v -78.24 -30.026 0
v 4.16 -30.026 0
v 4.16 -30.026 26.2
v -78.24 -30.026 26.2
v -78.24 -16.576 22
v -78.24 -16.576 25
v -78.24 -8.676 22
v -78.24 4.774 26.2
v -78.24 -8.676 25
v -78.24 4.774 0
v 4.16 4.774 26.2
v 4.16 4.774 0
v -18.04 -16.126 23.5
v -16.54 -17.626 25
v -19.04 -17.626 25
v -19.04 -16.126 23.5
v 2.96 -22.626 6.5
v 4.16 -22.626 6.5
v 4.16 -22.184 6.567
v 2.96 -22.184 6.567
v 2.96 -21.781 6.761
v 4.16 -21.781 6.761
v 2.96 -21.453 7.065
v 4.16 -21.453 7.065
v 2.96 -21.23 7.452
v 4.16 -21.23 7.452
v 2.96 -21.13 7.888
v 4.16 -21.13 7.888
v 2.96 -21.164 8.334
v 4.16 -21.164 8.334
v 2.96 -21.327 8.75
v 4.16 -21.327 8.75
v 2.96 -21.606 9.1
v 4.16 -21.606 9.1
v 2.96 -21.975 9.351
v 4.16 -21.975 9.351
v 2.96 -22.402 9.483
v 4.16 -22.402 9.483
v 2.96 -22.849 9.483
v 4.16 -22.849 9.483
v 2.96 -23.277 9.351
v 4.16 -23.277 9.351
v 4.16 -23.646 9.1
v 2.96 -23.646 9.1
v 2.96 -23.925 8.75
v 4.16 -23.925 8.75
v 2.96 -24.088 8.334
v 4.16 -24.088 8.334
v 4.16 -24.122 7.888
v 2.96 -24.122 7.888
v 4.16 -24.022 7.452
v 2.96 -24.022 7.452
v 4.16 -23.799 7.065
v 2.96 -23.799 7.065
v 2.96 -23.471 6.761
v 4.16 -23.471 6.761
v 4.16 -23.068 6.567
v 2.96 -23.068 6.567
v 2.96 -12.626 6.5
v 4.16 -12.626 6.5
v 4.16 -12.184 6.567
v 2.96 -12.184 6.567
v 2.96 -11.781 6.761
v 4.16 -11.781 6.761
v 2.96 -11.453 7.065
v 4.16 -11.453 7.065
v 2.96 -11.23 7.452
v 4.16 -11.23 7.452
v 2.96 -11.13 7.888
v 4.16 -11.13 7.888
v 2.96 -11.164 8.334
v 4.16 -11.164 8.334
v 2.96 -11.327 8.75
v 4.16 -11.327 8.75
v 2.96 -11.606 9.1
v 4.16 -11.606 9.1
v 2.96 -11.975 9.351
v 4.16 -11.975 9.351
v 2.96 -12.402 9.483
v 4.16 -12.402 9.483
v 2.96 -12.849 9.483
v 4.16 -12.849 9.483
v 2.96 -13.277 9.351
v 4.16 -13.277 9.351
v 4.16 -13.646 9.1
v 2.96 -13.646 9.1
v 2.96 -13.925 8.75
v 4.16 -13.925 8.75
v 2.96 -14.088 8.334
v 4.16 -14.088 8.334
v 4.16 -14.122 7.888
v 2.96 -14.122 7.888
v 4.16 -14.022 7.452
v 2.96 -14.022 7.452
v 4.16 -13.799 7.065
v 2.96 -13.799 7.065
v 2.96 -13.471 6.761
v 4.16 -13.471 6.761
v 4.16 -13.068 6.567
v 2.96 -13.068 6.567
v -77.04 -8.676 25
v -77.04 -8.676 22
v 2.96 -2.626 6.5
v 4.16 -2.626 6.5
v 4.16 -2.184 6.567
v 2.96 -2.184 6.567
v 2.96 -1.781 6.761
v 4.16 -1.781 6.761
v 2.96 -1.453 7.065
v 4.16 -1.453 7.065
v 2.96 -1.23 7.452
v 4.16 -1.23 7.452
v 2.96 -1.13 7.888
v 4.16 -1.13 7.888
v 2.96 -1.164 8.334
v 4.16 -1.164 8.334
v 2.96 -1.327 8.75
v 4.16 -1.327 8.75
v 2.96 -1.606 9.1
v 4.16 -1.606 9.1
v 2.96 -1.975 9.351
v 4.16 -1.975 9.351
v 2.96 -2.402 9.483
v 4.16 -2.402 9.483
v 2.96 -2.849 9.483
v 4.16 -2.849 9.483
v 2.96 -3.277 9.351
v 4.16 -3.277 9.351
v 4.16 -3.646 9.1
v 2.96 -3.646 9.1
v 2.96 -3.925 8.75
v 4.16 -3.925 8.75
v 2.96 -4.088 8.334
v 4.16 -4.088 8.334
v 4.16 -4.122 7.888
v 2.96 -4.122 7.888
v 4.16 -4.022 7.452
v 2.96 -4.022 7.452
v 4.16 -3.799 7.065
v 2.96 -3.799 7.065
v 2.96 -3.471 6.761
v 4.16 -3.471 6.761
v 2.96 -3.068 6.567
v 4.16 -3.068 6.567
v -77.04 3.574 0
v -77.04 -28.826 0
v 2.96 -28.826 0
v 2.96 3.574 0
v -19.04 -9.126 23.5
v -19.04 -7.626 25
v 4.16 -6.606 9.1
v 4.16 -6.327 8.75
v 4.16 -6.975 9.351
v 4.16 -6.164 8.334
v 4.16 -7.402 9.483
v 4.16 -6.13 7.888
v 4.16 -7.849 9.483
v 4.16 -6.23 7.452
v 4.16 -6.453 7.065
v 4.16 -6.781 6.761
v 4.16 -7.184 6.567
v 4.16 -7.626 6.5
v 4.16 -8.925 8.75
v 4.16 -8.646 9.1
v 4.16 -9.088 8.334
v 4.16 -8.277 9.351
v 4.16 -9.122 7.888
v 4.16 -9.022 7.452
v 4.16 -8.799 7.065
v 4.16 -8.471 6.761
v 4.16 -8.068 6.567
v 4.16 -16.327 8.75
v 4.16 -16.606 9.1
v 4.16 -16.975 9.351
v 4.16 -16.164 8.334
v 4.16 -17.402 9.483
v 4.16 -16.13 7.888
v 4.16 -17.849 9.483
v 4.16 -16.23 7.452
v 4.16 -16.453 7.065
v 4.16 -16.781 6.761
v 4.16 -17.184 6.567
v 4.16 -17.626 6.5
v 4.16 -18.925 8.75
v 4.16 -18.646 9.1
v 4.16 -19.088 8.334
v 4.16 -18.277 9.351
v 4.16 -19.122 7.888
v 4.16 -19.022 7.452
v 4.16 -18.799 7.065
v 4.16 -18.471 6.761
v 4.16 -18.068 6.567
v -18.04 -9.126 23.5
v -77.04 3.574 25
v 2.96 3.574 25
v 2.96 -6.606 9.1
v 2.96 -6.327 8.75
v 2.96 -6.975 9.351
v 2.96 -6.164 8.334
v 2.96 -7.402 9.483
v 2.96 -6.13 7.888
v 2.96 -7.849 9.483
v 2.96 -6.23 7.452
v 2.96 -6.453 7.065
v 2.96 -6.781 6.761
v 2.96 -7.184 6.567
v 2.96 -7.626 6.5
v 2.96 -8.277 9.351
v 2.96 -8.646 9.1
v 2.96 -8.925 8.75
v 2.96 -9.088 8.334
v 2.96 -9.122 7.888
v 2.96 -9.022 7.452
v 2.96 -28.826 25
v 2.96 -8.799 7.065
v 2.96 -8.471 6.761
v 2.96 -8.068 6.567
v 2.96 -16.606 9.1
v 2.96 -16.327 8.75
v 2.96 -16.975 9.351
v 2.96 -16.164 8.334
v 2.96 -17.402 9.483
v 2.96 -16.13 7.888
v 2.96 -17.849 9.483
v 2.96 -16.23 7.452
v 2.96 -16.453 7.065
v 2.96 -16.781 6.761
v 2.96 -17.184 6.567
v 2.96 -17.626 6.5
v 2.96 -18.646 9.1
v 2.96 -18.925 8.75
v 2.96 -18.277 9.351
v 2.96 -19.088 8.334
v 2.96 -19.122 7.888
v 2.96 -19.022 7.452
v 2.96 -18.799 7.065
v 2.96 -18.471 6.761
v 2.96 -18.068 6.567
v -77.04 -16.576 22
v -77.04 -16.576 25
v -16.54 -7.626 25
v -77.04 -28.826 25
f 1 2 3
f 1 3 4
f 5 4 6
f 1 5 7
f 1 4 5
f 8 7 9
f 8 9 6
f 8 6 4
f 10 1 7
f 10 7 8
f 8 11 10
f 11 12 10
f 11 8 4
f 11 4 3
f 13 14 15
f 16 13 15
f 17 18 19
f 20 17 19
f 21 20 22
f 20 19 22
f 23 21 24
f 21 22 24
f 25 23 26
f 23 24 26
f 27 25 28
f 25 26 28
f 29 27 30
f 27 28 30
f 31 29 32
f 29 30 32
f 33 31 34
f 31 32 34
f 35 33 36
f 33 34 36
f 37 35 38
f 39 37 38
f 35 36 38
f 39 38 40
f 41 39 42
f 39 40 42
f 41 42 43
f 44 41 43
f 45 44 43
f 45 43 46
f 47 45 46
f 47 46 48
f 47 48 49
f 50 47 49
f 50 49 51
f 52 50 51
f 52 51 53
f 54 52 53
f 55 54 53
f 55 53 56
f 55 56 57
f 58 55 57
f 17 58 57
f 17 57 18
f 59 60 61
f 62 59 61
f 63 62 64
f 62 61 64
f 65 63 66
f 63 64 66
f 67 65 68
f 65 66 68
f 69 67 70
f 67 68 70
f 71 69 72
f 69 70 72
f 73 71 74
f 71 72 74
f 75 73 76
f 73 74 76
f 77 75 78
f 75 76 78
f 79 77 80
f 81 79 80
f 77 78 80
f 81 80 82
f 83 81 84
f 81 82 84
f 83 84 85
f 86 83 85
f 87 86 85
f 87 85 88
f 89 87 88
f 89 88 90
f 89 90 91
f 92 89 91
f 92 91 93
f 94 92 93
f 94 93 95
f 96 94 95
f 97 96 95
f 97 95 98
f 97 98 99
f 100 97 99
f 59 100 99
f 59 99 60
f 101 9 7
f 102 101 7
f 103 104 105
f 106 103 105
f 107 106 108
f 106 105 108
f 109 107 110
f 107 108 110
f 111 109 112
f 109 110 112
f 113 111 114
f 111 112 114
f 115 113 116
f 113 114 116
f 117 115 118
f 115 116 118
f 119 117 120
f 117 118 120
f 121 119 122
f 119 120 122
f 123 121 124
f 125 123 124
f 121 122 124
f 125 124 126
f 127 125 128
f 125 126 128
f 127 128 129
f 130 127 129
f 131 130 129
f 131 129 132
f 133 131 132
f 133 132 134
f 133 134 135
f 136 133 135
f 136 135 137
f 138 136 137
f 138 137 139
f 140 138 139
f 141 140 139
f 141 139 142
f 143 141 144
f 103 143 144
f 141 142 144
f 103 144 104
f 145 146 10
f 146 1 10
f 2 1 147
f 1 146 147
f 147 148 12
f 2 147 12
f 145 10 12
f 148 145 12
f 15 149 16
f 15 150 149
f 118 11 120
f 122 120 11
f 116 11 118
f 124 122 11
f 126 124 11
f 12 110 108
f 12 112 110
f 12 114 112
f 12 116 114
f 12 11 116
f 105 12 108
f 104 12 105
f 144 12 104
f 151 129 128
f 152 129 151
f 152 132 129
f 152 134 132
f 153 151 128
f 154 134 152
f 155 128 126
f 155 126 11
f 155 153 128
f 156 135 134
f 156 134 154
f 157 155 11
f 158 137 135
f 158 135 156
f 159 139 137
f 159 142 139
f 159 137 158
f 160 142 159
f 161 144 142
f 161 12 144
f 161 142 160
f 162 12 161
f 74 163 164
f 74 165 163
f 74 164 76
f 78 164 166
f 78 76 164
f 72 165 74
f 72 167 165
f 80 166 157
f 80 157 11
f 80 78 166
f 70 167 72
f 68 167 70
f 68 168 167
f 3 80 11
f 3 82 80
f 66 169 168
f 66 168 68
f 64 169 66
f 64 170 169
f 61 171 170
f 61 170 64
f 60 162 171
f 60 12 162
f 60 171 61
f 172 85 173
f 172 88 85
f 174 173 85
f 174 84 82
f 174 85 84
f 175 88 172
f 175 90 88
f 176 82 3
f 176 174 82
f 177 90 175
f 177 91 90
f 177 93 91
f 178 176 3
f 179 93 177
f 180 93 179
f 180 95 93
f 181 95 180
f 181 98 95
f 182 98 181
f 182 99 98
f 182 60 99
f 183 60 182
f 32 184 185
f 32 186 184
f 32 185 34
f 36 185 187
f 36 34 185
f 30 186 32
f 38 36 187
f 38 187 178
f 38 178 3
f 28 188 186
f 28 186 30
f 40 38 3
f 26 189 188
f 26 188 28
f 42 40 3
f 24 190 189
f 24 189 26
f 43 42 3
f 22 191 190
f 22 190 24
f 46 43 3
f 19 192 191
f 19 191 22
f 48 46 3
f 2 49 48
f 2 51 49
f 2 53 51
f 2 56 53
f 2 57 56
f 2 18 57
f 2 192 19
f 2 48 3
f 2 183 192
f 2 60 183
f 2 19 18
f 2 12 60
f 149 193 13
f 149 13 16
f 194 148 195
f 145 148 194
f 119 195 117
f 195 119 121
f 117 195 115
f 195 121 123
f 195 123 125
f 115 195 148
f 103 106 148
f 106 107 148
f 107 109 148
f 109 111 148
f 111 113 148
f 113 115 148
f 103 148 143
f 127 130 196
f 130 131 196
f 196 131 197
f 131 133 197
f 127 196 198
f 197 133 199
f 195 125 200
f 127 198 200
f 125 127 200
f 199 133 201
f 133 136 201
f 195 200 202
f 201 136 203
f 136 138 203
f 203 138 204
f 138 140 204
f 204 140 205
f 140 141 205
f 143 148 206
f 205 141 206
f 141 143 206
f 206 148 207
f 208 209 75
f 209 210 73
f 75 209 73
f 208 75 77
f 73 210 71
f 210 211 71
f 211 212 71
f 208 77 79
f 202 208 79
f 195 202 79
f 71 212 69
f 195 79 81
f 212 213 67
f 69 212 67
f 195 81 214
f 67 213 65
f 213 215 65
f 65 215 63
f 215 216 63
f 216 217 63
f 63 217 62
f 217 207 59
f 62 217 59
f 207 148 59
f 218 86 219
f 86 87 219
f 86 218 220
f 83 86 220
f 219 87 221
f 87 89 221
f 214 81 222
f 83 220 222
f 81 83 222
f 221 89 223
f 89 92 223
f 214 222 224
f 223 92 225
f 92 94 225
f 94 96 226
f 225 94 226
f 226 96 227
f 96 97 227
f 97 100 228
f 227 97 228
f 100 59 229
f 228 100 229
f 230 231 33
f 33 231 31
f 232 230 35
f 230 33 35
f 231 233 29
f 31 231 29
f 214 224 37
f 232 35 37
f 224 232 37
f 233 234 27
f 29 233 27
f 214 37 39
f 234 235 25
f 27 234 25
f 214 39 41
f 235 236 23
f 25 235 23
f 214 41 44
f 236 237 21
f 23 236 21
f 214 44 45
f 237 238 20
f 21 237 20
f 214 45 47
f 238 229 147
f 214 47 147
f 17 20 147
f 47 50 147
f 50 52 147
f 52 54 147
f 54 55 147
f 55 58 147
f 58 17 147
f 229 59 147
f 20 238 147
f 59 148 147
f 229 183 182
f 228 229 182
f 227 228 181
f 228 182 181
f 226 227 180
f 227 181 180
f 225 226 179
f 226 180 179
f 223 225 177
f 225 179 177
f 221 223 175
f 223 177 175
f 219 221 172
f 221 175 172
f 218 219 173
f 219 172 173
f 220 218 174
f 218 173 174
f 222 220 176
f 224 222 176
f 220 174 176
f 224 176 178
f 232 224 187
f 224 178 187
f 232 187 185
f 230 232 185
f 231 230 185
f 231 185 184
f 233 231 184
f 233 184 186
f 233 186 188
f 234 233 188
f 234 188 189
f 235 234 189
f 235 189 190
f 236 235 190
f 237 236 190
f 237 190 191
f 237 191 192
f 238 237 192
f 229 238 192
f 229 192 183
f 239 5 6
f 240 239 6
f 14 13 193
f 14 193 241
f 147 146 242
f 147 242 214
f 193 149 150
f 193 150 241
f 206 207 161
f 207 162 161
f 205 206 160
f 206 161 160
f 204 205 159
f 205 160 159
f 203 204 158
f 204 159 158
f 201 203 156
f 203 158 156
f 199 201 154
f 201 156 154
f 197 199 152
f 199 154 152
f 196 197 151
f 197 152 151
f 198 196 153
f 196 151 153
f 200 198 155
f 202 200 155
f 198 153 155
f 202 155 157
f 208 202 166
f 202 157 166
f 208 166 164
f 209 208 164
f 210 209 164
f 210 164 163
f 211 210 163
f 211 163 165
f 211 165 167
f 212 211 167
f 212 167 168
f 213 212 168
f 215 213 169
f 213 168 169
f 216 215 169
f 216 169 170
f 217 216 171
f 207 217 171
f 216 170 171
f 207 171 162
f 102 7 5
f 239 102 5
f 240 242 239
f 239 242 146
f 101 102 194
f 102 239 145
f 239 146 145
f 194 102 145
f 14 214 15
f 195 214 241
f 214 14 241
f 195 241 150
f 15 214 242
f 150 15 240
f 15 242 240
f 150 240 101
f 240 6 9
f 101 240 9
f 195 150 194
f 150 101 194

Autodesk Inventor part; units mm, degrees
ref_plane "YZ Plane" through (0, 0, 0) normal (1, 0, 0) x (0, 1, 0)
ref_plane "XZ Plane" through (0, 0, 0) normal (0, 1, 0) x (-1, 0, 0)
ref_plane "XY Plane" through (0, 0, 0) normal (0, 0, 1) x (1, 0, 0)
sketch "Sketch1" plane through (0, 0, 0) normal (0, 0, 1) x (1, 0, 0)
  line L0 (-78.24, 3.5741) -> (4.16, 3.5741)
  line L1 (4.16, 3.5741) -> (4.16, -28.8259)
  line L2 (4.16, -28.8259) -> (-78.24, -28.8259)
  line L3 (-78.24, -28.8259) -> (-78.24, 3.5741)
  line L4 (-77.04, 2.3741) -> (2.96, 2.3741)
  line L5 (2.96, 2.3741) -> (2.96, -27.6259)
  line L6 (2.96, -27.6259) -> (-77.04, -27.6259)
  line L7 (-77.04, -27.6259) -> (-77.04, 2.3741)
  point P0 (0, 0)
  dimension "d0" = 32.4
  dimension "d1" = 82.4
  dimension "d2" = 1.2
  dimension "d3" = 1.2
  dimension "d4" = 1.2
  dimension "d5" = 1.2
extrude "Extrusion1" add sketch "Sketch1" along normal blind 25
sketch "Sketch2" plane through (0, 0, 25) normal (0, 0, 1) x (1, 0, 0)
  line L0 (-78.24, 3.5741) -> (4.16, 3.5741)
  line L1 (4.16, 3.5741) -> (4.16, -28.8259)
  line L2 (4.16, -28.8259) -> (-78.24, -28.8259)
  line L3 (-78.24, -28.8259) -> (-78.24, 3.5741)
  point P0 (0, 0)
extrude "Extrusion2" add sketch "Sketch2" along normal blind 1.2
sketch "Sketch3" plane through (-78.24, -28.8259, 0) normal (-1, 0, 0) x (0, 0, 1)
  line L0 (25, 1.2) -> (25, 31.2) projected
  line L1 (25, 12.45) -> (22, 12.45)
  line L2 (22, 12.45) -> (22, 19.95)
  line L3 (22, 19.95) -> (25, 19.95)
  line L4 (25, 19.95) -> (25, 12.45)
  line L5 (0, 1.2) -> (25, 1.2) projected
  line L6 (0, 31.2) -> (25, 31.2) projected
  point P0 (0, 28.8259)
  dimension "d10" = 7.5
  dimension "d11" = 3
  dimension "d12" = 11.25
  dimension "d13" = 11.25
extrude "Extrusion3" cut sketch "Sketch3" against normal blind 1.2
sketch "Sketch4" plane through (0, 0, 25) normal (0, 0, -1) x (-1, 0, 0)
  point P0 (0, 0)
sketch "Sketch5" plane through (0, 0, 25) normal (0, 0, -1) x (-1, 0, 0)
  line L0 (18.04, -7.6259) -> (19.04, -7.6259)
  line L1 (19.04, -7.6259) -> (19.04, -17.6259)
  line L2 (19.04, -17.6259) -> (18.04, -17.6259)
  line L3 (18.04, -17.6259) -> (18.04, -7.6259)
  line L4 (-2.96, 2.3741) -> (77.04, 2.3741) projected
  line L5 (77.04, -27.6259) -> (-2.96, -27.6259) projected
  line L6 (77.04, 2.3741) -> (77.04, -27.6259) projected
  point P0 (0, 0)
  dimension "d16" = 1
  dimension "d17" = 10
  dimension "d18" = 10
  dimension "d19" = 10
  dimension "d20" = 58
extrude "Extrusion4" add sketch "Sketch5" along normal blind 1.5
chamfer "Chamfer1" distance 1.5 angle 45 2 edges at (-18.54, -17.6259, 23.5) (-18.54, -7.6259, 23.5)
chamfer "Chamfer2" distance 1.5 angle 45 1 edges at (-18.04, -12.6259, 25)
sketch "Sketch6" plane through (-78.24, -28.8259, 0) normal (0, -1, 0) x (1, 0, 0)
  circle A0 centre (3.7, 12.5) radius 2.5
  line L0 (1.2, 0) -> (1.2, 25) projected
  point P0 (78.24, 0)
  dimension "d29" = 5
  dimension "d30" = 2.5
extrude "Extrusion5" cut sketch "Sketch6" against normal blind 40
sketch "Sketch7" plane through (4.16, -28.8259, 0) normal (1, 0, 0) x (0, 0, -1)
  line L0 (0, 31.2) -> (-25, 31.2) projected
  line L1 (0, 32.4) -> (0, 0) projected
  circle A0 centre (-8, 26.2) radius 1.5
  circle A1 centre (-8, 21.2) radius 1.5
  circle A2 centre (-8, 16.2) radius 1.5
  circle A3 centre (-8, 11.2) radius 1.5
  circle A4 centre (-8, 6.2) radius 1.5
  line L2 (0, 1.2) -> (-25, 1.2) projected
  point P0 (0, 28.8259)
  point P1 (-8, 31.2)
  dimension "d33" = 8
  dimension "d34" = 3
  dimension "d35" = 3
  dimension "d36" = 3
  dimension "d37" = 3
  dimension "d38" = 3
  dimension "d39" = 5
  dimension "d40" = 5
  dimension "d41" = 5
  dimension "d42" = 5
  dimension "d43" = 5
  dimension "d44" = 5
extrude "Extrusion6" cut sketch "Sketch7" against normal blind 3
sketch "Sketch8" plane through (0, 0, 0) normal (0, 0, -1) x (-1, 0, 0)
  line L0 (78.24, -28.8259) -> (-4.16, -28.8259)
  line L1 (-4.16, -28.8259) -> (-4.16, -30.0259)
  line L2 (-4.16, -30.0259) -> (78.24, -30.0259)
  line L3 (78.24, -30.0259) -> (78.24, -28.8259)
  line L4 (78.24, 3.5741) -> (-4.16, 3.5741)
  line L5 (-4.16, 3.5741) -> (-4.16, 4.7741)
  line L6 (-4.16, 4.7741) -> (78.24, 4.7741)
  line L7 (78.24, 4.7741) -> (78.24, 3.5741)
  line L8 (-4.16, 3.5741) -> (-4.16, -28.8259) projected
  point P0 (0, 0)
  dimension "d47" = 1.2
  dimension "d48" = 1.2
extrude "Extrusion7" add sketch "Sketch8" against normal blind 26.2
sketch "Sketch9" plane through (0, 0, 0) normal (0, 0, -1) x (-1, 0, 0)
  line L0 (-2.96, -27.6259) -> (77.04, -27.6259)
  line L1 (77.04, -27.6259) -> (77.04, -28.8259)
  line L2 (77.04, -28.8259) -> (-2.96, -28.8259)
  line L3 (-2.96, -28.8259) -> (-2.96, -27.6259)
  line L4 (77.04, 2.3741) -> (-2.96, 2.3741)
  line L5 (-2.96, 2.3741) -> (-2.96, 3.5741)
  line L6 (-2.96, 3.5741) -> (77.04, 3.5741)
  line L7 (77.04, 3.5741) -> (77.04, 2.3741)
  line L8 (-2.96, 2.3741) -> (77.04, 2.3741) projected
  line L9 (77.04, 2.3741) -> (77.04, -27.6259) projected
  point P0 (0, 0)
  dimension "d51" = 1.2
  dimension "d52" = 1.2
extrude "Extrusion8" cut sketch "Sketch9" against normal blind 25
sketch "Sketch10" plane through (-78.24, -30.0259, 0) normal (-1, 0, 0) x (0, 0, 1)
  line L0 (25, 21.15) -> (25, 33.6) projected
  line L1 (22, 13.45) -> (25, 13.45)
  line L2 (25, 13.45) -> (25, 21.35)
  line L3 (25, 21.35) -> (22, 21.35)
  line L4 (22, 21.35) -> (22, 13.45)
  line L5 (25, 13.65) -> (22, 13.65) projected
  line L6 (22, 21.15) -> (25, 21.15) projected
  line L7 (22, 13.65) -> (22, 21.15) projected
  point P0 (0, 30.0259)
  dimension "d55" = 0.2
  dimension "d56" = 0.2
extrude "Extrusion9" cut sketch "Sketch10" against normal blind 2
sketch "Sketch11" plane through (0, 0, 25) normal (0, 0, -1) x (-1, 0, 0)
  point P0 (0, 0)
properties part number "Case Botom v2"
